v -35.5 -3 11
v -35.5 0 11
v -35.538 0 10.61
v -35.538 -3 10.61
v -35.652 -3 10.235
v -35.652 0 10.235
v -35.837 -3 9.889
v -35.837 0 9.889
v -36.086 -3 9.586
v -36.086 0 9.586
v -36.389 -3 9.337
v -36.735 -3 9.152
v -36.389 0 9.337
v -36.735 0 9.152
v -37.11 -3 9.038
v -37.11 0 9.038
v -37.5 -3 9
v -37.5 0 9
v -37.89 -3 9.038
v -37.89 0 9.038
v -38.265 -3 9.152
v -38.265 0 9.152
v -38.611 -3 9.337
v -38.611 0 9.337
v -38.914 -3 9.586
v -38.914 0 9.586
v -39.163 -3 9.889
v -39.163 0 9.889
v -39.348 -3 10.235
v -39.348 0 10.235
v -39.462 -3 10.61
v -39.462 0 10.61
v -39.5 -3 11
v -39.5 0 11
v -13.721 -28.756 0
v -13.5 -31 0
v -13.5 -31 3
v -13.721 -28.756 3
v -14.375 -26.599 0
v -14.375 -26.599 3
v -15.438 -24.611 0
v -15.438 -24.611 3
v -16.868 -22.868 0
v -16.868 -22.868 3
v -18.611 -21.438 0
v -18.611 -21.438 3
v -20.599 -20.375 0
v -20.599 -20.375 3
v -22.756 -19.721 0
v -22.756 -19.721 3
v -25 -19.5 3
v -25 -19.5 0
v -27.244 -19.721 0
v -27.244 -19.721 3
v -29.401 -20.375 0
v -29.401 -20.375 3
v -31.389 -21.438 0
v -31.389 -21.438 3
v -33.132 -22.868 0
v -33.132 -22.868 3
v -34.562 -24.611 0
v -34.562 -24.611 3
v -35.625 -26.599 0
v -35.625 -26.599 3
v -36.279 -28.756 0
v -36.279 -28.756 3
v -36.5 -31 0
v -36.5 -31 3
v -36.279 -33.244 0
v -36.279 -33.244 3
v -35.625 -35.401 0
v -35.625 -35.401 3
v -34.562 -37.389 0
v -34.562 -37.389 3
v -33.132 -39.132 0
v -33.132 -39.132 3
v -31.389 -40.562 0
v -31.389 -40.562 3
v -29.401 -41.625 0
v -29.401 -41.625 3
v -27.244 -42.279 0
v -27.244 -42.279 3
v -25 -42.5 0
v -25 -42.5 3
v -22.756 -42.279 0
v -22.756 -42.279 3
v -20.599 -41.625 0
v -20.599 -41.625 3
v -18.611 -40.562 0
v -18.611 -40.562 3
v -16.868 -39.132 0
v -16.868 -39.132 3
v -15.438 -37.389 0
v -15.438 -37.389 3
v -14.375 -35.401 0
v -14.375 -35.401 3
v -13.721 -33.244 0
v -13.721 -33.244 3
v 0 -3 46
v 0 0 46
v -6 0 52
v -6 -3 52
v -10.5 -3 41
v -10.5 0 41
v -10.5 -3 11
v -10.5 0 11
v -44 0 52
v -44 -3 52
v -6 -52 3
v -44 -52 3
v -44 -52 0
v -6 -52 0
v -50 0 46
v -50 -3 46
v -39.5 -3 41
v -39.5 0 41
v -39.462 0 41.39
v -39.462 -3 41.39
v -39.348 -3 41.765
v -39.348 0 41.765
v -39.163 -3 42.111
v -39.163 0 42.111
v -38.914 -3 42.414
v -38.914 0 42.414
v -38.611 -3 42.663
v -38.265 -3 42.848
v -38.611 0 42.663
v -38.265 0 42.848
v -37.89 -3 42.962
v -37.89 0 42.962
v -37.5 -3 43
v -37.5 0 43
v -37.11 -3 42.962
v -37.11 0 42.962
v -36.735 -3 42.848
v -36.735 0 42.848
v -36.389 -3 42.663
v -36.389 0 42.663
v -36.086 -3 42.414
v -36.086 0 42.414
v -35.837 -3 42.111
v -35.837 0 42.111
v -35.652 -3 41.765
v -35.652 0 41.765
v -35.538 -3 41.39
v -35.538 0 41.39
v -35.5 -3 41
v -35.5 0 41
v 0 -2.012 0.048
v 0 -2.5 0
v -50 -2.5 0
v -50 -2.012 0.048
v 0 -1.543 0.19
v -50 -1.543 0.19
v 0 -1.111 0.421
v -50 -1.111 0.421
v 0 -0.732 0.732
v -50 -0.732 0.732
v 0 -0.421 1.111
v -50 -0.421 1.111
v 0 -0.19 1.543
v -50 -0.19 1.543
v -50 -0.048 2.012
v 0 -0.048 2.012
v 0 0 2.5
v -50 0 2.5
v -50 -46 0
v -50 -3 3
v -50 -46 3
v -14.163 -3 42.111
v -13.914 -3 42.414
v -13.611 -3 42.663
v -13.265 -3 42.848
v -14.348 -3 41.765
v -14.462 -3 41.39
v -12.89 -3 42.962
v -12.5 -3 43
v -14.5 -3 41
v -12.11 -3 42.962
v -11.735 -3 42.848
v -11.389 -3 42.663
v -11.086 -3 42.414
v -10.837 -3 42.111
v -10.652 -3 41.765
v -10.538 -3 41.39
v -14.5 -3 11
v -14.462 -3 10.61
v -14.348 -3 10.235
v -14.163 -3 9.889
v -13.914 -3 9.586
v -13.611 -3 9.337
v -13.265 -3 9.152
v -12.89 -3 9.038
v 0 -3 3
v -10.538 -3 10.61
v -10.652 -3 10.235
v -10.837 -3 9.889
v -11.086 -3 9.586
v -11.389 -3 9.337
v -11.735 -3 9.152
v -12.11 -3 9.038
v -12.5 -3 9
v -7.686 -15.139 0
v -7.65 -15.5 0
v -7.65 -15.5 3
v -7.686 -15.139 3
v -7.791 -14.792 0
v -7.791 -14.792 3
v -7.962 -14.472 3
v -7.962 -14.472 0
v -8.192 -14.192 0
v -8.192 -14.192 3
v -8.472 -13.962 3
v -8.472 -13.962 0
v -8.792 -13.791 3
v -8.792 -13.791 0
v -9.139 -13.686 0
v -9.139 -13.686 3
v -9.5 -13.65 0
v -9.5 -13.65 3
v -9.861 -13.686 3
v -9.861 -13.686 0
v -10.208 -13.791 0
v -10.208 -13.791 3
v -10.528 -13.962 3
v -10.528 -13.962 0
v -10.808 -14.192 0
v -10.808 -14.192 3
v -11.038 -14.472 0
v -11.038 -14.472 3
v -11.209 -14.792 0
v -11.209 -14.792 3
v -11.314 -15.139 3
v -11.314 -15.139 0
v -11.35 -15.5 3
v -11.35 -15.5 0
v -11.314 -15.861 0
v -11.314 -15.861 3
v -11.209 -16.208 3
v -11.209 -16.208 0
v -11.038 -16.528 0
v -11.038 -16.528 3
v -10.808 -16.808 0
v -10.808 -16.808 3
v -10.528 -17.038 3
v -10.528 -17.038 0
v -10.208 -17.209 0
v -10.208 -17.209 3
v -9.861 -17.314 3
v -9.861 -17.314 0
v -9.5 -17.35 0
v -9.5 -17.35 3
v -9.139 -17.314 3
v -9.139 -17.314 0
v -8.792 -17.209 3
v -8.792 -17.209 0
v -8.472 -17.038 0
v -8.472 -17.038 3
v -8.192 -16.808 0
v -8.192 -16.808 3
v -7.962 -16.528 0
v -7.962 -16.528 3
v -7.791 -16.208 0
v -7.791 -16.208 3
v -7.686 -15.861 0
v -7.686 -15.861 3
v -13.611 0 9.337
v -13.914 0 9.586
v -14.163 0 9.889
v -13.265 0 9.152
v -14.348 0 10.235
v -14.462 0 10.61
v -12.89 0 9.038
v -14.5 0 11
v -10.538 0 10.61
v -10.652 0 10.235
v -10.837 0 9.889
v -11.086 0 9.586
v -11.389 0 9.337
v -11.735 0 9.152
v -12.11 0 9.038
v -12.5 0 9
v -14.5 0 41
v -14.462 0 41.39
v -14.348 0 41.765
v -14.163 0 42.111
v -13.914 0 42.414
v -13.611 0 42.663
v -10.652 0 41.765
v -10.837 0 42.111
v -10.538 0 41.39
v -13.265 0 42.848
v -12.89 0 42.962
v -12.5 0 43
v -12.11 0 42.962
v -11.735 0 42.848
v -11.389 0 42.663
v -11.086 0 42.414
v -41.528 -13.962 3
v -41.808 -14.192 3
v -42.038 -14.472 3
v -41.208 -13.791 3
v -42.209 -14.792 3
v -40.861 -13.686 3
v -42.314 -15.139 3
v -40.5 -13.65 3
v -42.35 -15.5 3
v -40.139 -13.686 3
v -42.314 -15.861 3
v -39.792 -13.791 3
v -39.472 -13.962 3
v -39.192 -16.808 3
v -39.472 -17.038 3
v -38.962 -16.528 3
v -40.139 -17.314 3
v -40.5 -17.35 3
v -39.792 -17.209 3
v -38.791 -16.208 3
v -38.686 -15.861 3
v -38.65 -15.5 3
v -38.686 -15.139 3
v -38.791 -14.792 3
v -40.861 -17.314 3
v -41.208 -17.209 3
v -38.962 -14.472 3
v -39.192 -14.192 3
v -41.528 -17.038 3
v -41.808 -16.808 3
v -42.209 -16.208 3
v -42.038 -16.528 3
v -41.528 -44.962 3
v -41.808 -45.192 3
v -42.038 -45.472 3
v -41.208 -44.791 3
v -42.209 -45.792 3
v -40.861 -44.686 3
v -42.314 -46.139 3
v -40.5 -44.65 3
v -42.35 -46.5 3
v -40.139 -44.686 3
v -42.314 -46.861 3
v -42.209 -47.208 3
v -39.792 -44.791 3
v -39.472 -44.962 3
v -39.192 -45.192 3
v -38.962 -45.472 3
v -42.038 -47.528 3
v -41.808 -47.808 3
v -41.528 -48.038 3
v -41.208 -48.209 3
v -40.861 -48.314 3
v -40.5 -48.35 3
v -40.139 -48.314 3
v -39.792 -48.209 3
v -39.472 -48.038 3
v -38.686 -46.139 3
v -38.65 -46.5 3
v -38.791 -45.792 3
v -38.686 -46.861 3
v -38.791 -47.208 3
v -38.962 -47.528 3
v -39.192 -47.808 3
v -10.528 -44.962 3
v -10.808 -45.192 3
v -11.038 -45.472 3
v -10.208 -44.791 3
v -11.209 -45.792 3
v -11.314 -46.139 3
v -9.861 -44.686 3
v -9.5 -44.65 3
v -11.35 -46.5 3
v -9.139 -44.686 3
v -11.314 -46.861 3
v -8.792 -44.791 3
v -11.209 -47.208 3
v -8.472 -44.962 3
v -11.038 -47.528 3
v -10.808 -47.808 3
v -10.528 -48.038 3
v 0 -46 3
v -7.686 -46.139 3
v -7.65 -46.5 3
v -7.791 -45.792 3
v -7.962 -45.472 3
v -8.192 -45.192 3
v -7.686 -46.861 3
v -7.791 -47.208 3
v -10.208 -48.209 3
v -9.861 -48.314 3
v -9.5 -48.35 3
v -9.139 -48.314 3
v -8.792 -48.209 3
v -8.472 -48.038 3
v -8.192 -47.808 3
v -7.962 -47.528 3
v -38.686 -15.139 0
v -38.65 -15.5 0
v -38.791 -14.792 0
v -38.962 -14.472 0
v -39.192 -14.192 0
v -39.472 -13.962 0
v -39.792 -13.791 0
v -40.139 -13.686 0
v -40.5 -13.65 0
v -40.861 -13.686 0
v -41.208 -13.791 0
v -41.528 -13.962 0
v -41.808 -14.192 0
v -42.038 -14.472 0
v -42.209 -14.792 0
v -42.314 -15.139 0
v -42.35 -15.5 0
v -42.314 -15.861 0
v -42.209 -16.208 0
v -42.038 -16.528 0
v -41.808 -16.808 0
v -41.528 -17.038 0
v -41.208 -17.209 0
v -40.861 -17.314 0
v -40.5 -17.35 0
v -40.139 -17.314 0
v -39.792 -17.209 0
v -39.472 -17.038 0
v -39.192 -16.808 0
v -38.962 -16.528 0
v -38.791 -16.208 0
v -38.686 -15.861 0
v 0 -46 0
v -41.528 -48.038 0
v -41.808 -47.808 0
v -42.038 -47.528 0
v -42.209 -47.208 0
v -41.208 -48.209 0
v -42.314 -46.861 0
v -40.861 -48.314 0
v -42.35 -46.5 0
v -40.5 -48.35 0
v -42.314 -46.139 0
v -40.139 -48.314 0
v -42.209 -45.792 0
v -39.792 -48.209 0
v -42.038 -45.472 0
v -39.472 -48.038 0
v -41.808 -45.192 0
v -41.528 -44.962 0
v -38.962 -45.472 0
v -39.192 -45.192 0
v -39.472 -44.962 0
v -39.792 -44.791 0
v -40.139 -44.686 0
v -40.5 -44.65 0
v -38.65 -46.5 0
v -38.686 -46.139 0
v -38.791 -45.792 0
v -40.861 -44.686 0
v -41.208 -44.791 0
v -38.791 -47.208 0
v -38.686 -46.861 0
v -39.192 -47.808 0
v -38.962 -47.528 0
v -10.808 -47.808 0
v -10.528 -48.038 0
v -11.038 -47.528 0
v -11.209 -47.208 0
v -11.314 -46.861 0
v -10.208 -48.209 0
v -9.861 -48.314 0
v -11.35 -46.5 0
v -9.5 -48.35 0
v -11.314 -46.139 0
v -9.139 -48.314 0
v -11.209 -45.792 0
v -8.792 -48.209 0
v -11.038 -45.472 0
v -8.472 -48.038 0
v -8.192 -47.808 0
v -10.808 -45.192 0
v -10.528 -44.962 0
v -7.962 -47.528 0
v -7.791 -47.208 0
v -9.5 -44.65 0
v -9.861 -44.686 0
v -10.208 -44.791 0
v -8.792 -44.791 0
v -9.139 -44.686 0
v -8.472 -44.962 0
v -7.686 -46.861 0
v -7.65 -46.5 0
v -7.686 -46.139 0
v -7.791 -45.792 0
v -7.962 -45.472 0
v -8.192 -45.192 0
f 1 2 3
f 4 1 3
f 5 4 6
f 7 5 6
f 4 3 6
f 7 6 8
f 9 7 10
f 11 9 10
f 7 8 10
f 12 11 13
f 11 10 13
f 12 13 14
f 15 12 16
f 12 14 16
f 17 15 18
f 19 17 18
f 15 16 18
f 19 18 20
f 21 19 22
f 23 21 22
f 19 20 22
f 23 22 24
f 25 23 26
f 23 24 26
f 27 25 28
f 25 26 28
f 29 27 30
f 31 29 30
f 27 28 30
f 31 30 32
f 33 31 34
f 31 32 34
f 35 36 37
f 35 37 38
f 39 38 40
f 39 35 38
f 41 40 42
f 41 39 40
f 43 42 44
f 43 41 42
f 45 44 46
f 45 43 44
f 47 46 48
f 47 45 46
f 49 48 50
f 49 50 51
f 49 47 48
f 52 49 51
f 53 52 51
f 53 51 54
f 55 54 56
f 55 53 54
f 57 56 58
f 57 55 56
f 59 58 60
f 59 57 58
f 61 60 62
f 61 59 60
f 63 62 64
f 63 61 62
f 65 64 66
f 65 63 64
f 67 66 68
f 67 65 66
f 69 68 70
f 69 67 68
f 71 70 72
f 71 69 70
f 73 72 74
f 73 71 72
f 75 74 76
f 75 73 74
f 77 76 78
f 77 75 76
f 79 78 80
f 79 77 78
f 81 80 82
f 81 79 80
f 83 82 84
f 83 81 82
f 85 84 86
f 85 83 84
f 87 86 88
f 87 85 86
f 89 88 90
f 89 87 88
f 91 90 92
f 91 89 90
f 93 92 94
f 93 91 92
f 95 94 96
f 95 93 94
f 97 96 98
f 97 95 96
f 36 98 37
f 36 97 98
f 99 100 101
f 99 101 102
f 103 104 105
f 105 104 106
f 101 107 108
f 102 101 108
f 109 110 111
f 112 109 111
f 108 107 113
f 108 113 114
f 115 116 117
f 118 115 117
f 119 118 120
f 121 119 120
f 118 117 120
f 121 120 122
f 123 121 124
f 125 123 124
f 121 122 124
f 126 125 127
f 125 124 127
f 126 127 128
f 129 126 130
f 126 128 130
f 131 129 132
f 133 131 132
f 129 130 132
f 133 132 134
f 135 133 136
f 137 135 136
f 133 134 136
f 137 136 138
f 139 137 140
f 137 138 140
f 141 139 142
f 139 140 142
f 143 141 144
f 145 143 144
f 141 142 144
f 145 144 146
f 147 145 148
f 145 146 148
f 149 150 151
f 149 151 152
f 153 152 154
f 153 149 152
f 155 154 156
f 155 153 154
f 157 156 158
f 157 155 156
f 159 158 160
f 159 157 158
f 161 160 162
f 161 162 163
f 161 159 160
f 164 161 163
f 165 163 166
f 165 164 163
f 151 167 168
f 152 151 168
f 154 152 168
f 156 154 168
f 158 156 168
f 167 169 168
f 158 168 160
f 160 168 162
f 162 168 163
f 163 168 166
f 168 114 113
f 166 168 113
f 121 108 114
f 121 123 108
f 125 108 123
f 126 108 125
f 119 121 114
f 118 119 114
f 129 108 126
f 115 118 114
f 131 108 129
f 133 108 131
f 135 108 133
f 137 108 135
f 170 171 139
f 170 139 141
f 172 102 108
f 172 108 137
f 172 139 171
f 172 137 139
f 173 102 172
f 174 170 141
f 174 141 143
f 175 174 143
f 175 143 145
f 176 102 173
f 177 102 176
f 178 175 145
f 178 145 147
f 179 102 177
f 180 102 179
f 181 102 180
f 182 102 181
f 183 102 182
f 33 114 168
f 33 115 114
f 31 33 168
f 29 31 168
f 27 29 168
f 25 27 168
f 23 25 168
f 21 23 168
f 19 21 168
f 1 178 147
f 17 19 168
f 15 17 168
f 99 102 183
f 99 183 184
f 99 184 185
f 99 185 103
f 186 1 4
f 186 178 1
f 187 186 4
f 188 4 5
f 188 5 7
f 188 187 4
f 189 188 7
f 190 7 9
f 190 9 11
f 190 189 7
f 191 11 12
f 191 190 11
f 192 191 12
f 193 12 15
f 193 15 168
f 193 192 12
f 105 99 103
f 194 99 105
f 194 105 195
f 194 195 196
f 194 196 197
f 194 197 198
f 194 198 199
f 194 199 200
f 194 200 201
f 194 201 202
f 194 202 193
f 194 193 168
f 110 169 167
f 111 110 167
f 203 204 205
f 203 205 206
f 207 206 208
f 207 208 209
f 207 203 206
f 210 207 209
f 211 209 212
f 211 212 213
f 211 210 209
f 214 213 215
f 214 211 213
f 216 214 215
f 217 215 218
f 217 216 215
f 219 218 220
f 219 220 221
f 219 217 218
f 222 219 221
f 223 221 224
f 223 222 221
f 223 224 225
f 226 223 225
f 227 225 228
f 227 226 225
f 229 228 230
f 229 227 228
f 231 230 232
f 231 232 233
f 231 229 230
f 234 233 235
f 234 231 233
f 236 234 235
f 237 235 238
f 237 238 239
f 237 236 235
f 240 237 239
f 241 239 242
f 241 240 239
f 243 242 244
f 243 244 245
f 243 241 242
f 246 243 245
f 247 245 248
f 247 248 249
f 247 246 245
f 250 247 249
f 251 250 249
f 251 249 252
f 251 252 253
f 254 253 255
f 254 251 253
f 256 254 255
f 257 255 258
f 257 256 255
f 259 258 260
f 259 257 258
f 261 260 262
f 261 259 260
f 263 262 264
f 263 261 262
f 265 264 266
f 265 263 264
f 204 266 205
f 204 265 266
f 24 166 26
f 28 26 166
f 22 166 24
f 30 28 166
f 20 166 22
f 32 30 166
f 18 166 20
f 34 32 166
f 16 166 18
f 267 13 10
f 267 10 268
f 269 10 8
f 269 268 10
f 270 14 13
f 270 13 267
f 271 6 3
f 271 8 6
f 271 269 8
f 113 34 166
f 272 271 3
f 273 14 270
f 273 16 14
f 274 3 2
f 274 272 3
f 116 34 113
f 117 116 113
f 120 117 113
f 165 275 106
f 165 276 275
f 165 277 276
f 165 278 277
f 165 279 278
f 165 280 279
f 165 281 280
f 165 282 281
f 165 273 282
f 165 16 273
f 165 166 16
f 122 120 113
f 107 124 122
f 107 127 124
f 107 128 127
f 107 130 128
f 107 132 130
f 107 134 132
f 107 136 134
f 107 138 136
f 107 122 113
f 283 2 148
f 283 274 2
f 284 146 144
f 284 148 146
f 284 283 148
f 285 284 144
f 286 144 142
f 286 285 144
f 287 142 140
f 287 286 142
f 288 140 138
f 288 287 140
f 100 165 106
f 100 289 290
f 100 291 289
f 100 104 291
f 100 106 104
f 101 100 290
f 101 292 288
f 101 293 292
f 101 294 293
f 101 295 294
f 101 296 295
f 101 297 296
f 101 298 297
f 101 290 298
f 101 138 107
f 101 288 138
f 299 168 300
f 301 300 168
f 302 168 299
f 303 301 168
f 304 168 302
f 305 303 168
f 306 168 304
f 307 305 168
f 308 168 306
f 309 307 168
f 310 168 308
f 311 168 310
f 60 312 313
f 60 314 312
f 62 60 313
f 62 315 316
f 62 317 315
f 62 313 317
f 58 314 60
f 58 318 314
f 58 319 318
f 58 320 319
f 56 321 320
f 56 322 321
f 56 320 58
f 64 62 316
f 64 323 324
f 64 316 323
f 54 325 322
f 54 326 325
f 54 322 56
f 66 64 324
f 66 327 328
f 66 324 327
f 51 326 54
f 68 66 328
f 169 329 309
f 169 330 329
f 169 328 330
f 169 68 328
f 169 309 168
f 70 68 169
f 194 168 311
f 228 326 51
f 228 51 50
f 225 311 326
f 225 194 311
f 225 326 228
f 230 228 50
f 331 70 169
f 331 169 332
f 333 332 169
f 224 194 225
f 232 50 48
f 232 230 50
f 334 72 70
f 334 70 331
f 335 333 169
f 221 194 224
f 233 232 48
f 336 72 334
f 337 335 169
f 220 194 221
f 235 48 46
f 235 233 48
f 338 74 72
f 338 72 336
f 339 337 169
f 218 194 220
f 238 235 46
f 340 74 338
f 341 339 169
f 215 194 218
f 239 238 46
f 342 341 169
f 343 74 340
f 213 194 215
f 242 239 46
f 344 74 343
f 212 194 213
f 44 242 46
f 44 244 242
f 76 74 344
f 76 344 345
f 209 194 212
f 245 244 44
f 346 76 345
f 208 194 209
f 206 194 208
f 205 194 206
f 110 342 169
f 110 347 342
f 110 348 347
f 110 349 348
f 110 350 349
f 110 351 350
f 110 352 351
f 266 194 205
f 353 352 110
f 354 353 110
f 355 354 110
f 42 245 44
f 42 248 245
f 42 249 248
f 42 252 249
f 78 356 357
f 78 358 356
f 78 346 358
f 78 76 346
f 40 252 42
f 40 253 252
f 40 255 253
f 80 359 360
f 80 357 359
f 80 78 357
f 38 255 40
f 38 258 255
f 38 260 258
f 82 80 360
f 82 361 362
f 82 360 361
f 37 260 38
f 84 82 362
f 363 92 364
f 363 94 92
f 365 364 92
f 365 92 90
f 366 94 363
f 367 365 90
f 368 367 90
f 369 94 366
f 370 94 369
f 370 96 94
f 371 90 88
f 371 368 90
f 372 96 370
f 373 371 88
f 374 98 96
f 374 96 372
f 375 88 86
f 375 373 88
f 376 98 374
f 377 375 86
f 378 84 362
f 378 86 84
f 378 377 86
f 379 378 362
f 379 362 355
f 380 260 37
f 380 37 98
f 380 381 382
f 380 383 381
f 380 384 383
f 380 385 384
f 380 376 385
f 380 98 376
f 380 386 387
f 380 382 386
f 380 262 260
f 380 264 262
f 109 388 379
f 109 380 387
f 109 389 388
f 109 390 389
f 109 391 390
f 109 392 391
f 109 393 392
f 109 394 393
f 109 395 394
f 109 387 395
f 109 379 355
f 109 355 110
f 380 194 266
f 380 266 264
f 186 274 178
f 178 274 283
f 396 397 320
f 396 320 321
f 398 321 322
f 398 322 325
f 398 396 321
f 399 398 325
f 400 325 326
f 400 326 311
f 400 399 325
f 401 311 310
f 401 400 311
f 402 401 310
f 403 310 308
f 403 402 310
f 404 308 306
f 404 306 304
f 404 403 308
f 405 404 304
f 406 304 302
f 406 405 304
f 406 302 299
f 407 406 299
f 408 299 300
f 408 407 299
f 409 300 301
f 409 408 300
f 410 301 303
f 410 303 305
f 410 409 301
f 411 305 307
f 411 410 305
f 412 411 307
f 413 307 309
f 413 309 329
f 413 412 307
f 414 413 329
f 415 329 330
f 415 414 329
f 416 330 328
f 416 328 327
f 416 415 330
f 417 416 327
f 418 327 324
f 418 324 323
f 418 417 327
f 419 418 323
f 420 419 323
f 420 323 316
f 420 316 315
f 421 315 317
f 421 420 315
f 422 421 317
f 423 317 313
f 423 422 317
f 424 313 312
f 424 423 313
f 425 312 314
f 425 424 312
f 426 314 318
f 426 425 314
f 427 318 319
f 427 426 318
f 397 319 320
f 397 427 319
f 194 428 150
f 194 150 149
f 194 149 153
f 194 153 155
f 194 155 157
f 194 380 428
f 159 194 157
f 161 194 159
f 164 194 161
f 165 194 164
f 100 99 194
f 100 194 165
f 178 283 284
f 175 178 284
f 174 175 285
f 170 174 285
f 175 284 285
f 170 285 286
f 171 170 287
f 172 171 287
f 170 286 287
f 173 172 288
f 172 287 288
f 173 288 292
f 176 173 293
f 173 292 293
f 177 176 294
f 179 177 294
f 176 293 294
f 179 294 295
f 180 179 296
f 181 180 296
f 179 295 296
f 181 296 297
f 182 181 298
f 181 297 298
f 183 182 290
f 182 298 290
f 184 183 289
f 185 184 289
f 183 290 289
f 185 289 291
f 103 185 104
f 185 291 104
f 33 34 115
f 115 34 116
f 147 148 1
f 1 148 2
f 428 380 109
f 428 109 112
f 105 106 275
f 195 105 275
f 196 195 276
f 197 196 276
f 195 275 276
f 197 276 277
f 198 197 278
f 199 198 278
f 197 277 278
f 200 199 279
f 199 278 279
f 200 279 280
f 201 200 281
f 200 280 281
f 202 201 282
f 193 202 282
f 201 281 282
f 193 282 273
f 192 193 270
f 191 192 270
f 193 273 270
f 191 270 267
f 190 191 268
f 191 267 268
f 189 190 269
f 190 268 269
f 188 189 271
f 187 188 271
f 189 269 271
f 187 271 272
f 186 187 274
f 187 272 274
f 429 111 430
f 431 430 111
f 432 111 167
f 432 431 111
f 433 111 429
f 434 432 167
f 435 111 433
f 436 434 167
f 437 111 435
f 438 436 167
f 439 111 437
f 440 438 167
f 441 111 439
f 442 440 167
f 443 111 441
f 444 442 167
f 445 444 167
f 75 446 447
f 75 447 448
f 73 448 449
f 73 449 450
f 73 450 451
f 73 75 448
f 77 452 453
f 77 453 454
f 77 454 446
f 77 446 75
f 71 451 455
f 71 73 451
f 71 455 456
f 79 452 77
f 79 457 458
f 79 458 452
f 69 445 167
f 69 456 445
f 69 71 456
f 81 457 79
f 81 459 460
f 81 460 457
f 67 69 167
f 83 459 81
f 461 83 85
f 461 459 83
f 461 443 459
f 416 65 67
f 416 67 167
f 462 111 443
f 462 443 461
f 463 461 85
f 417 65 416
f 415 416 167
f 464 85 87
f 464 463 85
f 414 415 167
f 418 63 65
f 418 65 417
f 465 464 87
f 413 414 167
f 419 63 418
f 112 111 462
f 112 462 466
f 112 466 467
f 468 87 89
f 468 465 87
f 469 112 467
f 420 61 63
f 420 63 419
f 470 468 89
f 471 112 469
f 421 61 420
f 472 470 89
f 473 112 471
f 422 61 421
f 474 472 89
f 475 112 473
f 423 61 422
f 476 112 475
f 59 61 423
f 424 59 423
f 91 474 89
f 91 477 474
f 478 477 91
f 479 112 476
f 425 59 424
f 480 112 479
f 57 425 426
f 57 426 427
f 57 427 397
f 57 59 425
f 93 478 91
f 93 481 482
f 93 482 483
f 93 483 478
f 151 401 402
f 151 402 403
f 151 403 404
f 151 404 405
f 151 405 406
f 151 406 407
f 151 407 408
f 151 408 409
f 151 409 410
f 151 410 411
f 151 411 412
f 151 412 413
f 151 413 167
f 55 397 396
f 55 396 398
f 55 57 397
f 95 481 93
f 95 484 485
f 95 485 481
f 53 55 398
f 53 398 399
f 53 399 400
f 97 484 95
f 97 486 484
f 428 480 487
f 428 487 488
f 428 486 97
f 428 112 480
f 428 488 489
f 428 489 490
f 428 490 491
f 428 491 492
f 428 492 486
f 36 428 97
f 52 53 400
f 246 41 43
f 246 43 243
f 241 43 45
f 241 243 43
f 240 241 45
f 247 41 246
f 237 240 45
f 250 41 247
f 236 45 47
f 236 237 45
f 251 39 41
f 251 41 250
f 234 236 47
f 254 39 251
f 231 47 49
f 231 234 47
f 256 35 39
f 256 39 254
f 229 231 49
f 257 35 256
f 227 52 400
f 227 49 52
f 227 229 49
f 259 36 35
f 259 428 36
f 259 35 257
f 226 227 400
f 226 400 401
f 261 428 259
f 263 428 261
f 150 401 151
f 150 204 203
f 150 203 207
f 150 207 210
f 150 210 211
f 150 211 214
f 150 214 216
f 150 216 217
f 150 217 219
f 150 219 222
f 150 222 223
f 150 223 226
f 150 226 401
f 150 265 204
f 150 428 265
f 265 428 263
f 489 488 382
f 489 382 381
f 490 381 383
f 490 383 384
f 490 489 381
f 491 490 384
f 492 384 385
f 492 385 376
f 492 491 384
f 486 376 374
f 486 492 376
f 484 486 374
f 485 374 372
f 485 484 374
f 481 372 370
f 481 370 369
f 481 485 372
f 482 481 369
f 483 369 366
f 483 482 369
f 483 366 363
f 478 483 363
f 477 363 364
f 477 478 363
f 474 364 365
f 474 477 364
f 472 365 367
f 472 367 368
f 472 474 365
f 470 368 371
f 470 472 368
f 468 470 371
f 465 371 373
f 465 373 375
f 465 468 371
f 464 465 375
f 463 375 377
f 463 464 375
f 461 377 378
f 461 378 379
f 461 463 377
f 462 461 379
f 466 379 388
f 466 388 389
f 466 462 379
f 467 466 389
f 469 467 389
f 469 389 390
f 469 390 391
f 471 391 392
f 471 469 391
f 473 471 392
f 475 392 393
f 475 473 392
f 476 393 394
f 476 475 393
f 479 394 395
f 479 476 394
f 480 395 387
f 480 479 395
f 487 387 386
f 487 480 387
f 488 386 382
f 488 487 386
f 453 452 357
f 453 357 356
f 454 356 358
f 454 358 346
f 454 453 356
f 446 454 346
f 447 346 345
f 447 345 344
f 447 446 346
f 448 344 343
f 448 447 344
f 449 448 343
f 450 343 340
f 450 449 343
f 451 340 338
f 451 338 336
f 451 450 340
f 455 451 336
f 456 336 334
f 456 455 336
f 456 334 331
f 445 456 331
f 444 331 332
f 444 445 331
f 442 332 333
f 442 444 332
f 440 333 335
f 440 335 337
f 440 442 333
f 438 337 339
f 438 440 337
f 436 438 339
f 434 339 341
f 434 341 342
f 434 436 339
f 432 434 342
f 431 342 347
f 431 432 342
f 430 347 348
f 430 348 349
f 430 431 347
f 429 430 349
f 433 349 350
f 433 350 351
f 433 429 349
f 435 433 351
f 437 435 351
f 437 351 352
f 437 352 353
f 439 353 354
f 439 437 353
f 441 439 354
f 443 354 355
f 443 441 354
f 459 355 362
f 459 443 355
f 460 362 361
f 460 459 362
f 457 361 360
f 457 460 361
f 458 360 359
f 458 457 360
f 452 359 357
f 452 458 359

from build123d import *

# Parameters (mm, degrees)
F1_DEPTH = 50
F2_R     = 11.5
F2_R_2   = 1.85
F3_DEPTH = 3
F4_SIZE  = 6
F6_DEPTH = 3


with BuildPart() as f1:
    # F0 (on Right) → F1 (new body)
    with BuildSketch(Plane.YZ):
        with BuildLine():
            Line((-52, 3), (-52, 0))
            Line((-52, 0), (-2.5, 0))
            ThreePointArc((-2.5, 0), (-0.732233, 0.732233), (0, 2.5))
            Line((0, 2.5), (0, 52))
            Line((0, 52), (-3, 52))
            Line((-3, 52), (-3, 3))
            Line((-3, 3), (-52, 3))
        make_face()
    extrude(amount=-F1_DEPTH)

    # F2 (on Top) → F3 (cut)
    with BuildSketch(Plane.XY):
        with Locations((-25, -31)):
            Circle(F2_R)
        with Locations((-9.5, -46.5)):
            Circle(F2_R_2)
        with Locations((-9.5, -15.5)):
            Circle(F2_R_2)
        with Locations((-40.5, -46.5)):
            Circle(F2_R_2)
        with Locations((-40.5, -15.5)):
            Circle(F2_R_2)
    extrude(amount=F3_DEPTH, mode=Mode.SUBTRACT)

    # F4
    f4_edges = [f1.edges().sort_by_distance(p)[0] for p in [
        (0, -52, 1.5),
        (-50, -52, 1.5),
        (0, -1.5, 52),
        (-50, -1.5, 52),
    ]]
    chamfer(f4_edges, length=F4_SIZE)

    # F5 (on face) → F6 (cut)
    with BuildSketch(Plane(origin=(0, 0, 0), x_dir=(-1, 0, 0), z_dir=(0, 1, 0))):
        with BuildLine():
            Line((39.5, 11), (39.5, 41))
            ThreePointArc((39.5, 41), (37.5, 43), (35.5, 41))
            Line((35.5, 41), (35.5, 11))
            ThreePointArc((35.5, 11), (37.5, 9), (39.5, 11))
        make_face()
        with BuildLine():
            ThreePointArc((14.5, 41), (12.5, 43), (10.5, 41))
            Line((10.5, 41), (10.5, 11))
            ThreePointArc((10.5, 11), (12.5, 9), (14.5, 11))
            Line((14.5, 11), (14.5, 41))
        make_face()
    extrude(amount=-F6_DEPTH, mode=Mode.SUBTRACT)


solid = f1.part
